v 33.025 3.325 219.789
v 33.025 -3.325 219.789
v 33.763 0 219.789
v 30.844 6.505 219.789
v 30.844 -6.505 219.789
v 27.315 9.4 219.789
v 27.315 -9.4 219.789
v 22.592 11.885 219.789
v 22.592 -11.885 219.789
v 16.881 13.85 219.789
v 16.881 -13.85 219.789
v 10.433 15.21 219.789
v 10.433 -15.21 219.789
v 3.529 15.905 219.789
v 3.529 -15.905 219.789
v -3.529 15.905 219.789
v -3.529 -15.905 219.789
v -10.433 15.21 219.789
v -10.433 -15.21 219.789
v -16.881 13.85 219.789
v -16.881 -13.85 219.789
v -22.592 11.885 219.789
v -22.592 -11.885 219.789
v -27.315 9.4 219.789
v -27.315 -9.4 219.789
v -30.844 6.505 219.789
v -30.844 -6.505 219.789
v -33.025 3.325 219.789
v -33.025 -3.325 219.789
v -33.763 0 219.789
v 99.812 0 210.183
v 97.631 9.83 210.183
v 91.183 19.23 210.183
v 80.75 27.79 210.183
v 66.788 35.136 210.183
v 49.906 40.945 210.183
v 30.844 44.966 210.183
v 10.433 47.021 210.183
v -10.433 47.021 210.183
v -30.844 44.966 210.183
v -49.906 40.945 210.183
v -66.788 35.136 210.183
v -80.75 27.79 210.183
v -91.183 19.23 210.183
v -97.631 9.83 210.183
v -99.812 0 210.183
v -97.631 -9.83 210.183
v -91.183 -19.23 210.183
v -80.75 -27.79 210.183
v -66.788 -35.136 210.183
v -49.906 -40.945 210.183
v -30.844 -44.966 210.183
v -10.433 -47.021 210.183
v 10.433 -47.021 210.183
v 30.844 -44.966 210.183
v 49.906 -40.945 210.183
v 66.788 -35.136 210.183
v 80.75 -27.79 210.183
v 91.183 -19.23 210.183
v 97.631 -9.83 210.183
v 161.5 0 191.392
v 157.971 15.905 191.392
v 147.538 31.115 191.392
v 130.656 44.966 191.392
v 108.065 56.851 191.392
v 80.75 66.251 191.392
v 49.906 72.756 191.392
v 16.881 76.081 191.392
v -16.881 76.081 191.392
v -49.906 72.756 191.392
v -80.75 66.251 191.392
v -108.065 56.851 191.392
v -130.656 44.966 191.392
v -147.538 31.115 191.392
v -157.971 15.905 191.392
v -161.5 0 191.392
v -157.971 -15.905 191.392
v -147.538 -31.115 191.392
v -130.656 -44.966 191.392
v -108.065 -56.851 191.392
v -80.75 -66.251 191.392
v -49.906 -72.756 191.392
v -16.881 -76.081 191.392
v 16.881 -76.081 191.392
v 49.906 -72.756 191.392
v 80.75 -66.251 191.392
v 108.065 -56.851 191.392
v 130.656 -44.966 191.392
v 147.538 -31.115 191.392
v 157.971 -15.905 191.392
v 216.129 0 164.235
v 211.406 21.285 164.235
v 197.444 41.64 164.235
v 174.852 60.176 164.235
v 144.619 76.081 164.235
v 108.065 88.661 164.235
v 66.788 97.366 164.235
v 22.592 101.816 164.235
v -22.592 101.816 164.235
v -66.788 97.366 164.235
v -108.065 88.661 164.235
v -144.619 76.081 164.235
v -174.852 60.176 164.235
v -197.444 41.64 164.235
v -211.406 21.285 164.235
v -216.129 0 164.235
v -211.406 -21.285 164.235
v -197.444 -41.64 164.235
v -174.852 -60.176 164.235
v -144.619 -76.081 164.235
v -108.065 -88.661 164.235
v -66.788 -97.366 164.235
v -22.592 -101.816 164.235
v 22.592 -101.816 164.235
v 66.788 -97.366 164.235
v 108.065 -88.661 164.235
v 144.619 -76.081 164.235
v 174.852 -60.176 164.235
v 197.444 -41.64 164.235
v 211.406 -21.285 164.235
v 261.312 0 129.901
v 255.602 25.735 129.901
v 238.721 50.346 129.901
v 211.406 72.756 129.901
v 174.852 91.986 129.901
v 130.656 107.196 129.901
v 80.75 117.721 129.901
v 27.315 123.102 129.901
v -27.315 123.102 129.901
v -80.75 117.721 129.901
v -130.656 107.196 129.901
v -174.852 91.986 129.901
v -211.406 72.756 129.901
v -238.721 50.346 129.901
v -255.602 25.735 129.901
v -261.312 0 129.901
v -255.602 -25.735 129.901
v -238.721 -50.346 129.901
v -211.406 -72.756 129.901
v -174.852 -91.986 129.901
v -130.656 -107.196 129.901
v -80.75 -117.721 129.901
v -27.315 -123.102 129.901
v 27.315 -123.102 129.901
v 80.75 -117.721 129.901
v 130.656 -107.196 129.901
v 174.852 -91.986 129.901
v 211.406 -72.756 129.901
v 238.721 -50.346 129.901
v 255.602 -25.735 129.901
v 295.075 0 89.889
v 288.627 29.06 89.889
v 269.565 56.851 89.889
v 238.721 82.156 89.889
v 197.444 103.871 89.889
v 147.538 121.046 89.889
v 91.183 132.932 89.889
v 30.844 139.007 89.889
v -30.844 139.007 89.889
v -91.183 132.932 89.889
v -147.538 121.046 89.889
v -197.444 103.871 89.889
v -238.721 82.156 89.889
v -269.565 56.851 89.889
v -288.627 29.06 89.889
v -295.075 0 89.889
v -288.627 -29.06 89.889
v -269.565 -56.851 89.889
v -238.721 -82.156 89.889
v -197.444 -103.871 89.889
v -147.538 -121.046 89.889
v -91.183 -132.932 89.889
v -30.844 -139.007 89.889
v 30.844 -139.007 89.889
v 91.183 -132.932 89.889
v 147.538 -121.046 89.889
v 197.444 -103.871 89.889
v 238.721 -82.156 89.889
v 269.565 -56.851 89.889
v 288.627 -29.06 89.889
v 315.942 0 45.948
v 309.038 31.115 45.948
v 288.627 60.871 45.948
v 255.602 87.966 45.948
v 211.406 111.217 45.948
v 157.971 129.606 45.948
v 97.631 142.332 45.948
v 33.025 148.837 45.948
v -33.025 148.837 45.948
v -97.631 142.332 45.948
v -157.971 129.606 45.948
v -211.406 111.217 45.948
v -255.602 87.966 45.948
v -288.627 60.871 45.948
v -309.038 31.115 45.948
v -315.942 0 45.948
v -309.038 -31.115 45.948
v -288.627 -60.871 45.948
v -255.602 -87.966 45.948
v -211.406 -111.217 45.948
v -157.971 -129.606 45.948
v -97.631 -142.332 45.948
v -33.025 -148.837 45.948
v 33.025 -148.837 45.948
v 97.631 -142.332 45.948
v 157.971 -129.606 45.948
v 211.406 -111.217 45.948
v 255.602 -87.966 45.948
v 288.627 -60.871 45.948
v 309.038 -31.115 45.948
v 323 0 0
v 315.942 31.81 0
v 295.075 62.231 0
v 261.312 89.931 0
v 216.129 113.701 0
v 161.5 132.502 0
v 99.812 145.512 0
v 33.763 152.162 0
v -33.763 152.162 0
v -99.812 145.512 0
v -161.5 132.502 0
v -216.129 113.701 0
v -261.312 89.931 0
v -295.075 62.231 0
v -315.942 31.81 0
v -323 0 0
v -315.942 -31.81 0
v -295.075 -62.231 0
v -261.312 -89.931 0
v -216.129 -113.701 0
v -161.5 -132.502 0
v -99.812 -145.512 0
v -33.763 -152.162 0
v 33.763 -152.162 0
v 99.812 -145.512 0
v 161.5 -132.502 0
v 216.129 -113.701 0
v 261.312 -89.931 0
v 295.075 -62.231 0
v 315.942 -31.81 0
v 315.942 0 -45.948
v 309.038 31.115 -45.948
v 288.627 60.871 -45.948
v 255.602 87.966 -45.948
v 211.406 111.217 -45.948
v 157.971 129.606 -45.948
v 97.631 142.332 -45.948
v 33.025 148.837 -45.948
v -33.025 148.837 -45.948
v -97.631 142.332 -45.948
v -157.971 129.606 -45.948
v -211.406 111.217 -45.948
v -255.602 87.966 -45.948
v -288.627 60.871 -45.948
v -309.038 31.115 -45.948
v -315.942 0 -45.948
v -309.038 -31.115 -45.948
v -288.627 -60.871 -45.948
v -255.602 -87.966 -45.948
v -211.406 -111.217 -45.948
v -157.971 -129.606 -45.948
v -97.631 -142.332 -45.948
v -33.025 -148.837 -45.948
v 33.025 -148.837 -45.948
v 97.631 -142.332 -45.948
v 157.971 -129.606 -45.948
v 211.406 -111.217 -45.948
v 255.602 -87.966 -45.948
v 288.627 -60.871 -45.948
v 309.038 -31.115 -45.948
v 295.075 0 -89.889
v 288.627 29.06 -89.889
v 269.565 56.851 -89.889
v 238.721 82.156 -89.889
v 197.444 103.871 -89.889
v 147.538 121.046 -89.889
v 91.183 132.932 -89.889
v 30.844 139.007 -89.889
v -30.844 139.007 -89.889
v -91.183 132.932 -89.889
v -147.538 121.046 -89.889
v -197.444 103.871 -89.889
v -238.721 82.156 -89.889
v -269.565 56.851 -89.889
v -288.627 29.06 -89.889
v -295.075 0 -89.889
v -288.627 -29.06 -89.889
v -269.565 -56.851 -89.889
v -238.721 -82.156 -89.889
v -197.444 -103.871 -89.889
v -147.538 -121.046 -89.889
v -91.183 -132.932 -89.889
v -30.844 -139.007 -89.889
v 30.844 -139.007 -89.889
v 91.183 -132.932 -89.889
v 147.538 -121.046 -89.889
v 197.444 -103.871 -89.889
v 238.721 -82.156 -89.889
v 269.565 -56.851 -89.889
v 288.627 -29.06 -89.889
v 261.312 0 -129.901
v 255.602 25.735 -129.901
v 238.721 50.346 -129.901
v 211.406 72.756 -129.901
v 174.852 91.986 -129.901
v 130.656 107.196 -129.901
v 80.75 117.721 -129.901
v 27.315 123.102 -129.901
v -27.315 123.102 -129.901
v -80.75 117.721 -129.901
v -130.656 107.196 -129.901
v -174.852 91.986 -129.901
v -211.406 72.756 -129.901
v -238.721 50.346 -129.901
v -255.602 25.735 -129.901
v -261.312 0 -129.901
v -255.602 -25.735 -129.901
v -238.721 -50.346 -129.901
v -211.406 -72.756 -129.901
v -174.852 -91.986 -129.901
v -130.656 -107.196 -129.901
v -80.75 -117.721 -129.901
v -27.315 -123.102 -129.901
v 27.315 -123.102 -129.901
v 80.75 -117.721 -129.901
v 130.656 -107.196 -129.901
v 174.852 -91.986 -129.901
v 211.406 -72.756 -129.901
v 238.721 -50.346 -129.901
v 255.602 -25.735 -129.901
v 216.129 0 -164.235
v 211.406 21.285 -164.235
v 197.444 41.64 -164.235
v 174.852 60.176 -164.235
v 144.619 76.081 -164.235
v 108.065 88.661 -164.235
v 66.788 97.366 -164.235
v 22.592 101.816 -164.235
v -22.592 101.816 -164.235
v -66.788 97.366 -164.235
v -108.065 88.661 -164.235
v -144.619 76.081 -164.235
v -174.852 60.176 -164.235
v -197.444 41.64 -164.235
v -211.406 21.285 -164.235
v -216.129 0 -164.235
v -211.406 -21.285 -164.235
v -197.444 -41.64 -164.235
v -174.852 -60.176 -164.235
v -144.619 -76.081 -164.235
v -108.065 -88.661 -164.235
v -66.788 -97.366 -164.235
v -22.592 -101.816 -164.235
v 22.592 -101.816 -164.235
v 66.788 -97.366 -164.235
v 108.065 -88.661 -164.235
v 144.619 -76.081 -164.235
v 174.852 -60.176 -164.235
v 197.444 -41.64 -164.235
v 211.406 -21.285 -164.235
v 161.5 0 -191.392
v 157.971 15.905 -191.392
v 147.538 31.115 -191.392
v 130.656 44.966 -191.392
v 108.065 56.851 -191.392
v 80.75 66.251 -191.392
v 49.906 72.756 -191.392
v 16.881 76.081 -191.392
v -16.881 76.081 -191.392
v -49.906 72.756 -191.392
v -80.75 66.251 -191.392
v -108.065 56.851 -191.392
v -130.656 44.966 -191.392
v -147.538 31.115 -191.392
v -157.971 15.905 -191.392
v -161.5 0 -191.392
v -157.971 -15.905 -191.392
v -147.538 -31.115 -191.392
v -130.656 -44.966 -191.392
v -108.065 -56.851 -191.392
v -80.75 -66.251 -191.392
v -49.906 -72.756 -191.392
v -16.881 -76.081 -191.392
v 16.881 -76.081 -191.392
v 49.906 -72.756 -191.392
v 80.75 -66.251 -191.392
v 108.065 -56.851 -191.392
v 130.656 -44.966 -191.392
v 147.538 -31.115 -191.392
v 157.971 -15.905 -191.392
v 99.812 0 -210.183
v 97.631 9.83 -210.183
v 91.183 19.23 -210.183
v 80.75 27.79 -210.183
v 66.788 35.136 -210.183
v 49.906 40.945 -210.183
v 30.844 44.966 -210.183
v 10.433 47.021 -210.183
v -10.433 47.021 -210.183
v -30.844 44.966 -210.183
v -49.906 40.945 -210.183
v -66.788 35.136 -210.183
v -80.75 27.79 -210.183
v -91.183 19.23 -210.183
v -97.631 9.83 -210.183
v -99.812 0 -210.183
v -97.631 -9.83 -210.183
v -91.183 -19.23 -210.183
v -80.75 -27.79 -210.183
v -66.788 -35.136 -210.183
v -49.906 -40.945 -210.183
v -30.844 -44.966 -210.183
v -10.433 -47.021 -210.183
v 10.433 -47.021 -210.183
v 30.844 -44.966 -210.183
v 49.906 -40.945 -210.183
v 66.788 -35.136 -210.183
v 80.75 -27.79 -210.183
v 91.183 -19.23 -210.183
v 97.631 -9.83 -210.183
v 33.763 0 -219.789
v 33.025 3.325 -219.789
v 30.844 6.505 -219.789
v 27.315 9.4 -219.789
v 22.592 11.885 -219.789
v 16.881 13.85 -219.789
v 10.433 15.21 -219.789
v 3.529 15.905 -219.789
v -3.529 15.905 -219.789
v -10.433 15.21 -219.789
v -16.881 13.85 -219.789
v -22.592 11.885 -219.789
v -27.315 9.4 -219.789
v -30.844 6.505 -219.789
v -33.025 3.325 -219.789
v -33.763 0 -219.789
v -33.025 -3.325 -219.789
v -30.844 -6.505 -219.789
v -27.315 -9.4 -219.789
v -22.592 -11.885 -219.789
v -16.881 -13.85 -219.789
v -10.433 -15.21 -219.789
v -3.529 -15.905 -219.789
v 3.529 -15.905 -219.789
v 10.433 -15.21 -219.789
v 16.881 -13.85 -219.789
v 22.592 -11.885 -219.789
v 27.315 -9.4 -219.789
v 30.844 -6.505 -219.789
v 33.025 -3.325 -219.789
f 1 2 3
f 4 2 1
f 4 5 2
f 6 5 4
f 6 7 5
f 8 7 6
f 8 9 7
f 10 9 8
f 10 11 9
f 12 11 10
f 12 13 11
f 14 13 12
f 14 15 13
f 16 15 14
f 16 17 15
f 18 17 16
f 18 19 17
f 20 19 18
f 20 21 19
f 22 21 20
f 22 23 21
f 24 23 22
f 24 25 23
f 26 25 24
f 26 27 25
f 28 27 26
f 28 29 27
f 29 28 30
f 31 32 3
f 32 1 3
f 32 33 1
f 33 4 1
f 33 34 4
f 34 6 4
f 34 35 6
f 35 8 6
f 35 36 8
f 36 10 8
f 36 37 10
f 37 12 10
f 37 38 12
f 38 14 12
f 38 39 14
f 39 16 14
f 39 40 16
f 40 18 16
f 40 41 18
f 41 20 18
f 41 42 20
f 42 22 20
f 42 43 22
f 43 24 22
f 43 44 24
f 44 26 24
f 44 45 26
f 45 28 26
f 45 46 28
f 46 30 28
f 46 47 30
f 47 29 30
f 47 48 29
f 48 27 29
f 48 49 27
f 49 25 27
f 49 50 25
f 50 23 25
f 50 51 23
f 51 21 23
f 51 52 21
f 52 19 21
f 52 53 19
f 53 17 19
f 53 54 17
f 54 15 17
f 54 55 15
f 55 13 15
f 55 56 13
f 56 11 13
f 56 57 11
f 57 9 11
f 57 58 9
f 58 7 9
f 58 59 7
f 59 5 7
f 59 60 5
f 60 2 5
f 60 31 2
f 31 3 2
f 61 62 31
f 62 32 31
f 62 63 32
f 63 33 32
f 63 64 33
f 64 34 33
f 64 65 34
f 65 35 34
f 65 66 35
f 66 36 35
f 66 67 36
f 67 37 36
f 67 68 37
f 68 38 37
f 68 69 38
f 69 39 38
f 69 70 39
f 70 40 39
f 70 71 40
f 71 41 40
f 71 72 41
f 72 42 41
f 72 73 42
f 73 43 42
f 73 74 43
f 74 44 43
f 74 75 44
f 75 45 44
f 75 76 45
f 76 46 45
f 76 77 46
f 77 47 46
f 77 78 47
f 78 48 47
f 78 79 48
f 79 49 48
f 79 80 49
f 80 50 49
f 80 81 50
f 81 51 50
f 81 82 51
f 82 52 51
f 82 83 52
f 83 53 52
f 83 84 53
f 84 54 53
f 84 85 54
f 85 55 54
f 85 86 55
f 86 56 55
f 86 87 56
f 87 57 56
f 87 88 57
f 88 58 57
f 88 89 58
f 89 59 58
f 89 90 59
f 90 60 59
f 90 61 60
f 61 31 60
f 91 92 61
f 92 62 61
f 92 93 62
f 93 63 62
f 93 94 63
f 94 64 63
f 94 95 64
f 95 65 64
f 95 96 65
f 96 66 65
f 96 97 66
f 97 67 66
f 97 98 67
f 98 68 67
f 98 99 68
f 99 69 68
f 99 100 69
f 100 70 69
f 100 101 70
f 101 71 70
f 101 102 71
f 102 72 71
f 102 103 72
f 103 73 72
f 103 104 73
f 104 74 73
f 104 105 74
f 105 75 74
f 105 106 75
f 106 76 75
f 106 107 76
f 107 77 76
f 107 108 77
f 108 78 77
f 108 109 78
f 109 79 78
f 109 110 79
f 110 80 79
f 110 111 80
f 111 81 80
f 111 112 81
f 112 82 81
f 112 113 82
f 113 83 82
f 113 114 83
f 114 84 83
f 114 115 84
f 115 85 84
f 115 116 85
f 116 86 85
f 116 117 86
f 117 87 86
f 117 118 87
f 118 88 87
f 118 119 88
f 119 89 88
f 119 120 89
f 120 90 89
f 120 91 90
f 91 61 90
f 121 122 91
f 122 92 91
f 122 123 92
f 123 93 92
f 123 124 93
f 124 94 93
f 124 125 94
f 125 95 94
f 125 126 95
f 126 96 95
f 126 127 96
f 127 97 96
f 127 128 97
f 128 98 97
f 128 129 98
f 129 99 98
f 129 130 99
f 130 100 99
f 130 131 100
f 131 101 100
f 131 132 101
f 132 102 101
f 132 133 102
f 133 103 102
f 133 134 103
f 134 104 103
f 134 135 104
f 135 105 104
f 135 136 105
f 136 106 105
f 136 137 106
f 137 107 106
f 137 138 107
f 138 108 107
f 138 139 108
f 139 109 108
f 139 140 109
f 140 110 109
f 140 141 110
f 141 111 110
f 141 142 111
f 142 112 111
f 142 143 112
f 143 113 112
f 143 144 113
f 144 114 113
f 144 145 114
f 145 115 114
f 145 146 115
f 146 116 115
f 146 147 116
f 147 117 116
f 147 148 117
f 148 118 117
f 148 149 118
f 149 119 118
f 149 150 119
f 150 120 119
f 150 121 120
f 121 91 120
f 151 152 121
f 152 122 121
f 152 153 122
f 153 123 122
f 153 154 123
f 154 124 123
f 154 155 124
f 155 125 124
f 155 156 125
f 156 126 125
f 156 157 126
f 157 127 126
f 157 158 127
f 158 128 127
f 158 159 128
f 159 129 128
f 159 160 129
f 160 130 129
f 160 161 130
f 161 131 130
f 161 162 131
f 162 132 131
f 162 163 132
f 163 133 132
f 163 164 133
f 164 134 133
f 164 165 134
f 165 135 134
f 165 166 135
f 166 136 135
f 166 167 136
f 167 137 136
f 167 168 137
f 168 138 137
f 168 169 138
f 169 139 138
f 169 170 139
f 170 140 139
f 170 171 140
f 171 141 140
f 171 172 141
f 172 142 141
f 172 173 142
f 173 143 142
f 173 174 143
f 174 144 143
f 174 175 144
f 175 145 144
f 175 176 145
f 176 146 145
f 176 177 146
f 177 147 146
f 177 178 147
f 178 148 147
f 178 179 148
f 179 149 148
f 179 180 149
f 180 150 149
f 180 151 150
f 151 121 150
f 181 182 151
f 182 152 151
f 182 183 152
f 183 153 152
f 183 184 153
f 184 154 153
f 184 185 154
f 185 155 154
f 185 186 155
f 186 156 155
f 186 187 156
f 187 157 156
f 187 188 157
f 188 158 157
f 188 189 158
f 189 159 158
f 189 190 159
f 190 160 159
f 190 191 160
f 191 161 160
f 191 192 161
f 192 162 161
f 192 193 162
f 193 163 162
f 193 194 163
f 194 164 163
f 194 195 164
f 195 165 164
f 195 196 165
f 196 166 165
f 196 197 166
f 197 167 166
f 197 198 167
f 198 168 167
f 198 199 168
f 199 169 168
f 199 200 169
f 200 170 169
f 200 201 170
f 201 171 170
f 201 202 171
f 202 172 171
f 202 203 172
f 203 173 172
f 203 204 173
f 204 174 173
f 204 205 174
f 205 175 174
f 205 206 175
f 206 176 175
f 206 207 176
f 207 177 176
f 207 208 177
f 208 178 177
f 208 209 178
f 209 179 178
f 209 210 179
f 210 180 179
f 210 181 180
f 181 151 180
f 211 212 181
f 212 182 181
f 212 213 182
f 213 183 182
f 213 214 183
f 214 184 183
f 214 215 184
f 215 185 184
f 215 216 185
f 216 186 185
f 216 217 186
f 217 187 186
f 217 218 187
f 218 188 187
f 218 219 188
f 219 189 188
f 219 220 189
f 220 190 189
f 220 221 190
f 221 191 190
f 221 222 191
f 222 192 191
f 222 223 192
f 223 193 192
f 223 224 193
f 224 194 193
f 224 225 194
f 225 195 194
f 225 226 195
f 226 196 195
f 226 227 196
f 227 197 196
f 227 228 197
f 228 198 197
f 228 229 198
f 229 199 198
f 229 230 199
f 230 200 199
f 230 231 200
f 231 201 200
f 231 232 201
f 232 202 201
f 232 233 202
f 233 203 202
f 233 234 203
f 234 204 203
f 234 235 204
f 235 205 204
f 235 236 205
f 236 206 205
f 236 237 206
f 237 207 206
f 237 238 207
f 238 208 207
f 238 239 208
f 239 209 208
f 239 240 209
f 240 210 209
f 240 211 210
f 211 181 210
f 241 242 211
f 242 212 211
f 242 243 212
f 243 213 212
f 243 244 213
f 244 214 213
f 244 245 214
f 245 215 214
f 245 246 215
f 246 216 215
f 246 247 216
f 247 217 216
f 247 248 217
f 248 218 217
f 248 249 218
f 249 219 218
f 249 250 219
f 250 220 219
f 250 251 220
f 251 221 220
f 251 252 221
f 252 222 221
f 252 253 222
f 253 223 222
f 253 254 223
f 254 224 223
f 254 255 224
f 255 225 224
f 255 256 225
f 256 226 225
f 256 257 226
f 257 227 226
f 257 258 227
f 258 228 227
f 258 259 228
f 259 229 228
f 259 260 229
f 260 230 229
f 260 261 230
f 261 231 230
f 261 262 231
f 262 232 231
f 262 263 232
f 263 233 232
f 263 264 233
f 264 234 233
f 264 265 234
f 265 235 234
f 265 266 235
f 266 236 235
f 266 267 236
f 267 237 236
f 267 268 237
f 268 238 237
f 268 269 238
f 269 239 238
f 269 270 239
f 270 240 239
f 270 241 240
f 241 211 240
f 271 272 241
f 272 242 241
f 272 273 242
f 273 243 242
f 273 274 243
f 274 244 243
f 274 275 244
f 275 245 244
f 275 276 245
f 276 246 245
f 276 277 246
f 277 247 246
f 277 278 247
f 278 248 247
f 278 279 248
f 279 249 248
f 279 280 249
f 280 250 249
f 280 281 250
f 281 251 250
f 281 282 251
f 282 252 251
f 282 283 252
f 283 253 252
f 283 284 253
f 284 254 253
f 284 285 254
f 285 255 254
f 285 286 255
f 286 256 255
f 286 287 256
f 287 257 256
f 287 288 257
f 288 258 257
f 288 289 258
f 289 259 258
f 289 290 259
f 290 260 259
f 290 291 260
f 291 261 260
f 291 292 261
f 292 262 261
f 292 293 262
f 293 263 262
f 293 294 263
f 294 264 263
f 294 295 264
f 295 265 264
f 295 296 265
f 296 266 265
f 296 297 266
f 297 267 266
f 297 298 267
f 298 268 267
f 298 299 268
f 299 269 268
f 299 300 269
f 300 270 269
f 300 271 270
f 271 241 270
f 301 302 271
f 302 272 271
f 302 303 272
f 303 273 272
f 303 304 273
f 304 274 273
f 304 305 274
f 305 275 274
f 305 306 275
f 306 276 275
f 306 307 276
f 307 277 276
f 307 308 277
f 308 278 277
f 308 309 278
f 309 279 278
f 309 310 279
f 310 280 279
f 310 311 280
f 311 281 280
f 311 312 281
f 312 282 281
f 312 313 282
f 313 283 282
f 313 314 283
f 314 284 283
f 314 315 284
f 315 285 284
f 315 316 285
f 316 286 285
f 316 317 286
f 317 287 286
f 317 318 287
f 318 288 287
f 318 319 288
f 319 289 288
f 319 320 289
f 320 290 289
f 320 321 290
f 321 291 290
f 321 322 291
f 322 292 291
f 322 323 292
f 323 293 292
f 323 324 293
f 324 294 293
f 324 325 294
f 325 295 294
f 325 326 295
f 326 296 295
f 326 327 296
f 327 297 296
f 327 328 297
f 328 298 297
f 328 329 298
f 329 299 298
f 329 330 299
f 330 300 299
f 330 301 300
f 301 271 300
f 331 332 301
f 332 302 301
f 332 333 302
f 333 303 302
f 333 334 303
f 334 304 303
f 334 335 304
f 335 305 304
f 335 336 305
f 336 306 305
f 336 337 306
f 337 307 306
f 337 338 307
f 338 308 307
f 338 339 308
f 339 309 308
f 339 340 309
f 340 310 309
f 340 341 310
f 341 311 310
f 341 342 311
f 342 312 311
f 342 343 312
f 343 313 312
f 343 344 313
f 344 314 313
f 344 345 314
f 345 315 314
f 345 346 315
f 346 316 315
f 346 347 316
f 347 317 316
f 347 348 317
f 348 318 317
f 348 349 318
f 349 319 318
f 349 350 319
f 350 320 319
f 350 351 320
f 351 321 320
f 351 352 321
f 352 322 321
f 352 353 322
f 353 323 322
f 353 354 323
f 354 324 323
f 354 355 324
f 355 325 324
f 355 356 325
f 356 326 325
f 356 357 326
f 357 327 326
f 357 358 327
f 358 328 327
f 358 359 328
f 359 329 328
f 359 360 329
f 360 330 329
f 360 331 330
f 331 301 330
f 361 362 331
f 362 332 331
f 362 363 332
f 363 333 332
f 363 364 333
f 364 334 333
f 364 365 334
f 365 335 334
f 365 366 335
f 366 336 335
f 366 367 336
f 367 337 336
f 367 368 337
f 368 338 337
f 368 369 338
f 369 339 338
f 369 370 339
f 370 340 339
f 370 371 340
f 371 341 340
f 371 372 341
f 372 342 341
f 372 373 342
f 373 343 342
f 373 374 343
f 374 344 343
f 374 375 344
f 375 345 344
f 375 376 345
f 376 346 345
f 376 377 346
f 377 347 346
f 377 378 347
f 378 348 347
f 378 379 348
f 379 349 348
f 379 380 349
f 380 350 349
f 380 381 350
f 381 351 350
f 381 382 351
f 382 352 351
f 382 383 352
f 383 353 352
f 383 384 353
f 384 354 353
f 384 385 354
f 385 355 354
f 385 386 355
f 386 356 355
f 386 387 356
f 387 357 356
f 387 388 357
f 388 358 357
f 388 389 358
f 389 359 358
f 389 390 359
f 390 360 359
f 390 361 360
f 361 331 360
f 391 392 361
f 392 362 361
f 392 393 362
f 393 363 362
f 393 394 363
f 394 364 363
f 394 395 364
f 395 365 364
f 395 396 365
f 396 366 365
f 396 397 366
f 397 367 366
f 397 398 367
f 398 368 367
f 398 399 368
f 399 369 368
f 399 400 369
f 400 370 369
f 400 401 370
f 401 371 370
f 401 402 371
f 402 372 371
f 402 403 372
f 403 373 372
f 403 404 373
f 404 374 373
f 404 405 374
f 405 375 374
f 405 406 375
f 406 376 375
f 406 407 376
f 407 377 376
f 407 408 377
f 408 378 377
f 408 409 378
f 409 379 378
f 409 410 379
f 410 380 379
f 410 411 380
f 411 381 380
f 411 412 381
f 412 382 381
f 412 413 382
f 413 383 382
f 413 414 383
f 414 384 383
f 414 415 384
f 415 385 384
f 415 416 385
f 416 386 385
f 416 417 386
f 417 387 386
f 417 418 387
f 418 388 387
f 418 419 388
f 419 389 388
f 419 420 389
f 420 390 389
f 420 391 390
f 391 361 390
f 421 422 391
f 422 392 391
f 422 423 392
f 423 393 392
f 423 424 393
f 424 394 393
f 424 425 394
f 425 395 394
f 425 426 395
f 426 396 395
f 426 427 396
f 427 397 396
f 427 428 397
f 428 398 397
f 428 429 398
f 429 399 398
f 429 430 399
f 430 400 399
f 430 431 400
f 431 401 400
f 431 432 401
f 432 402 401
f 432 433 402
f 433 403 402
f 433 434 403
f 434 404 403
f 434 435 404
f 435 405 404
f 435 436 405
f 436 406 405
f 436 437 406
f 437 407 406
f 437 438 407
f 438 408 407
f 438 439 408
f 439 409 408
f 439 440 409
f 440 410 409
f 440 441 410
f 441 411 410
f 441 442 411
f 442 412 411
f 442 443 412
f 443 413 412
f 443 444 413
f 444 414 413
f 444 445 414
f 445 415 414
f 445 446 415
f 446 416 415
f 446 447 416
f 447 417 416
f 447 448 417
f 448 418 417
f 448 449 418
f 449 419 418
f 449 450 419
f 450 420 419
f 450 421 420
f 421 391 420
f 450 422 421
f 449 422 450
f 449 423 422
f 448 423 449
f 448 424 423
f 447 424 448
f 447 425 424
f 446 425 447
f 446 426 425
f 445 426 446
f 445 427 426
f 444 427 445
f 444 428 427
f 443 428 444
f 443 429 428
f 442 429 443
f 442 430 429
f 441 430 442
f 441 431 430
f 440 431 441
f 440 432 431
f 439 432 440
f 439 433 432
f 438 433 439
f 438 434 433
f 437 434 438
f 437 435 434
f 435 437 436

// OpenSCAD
// Generated by SolidPython 1.0.1 on 2020-07-29 00:46:54


scale(v = [19, 9, 13]) {
	sphere(r = 17);
}
/***********************************************
*********      SolidPython code:      **********
************************************************
 
# import packages: SolidPython
from solid import *
from solid.utils import *
from itertools import chain, combinations, permutations


class Resize:

    def __init__(self, scad_file):
        self.scad_file = scad_file
        #self.scad_file = import_scad(scad_file)
        # cone/cylinder param:
        self.r1 = 0
        self.r2 = 0
        self.h = 0
        # rectangular prism param:
        self.w = 0
        self.l = 0
        # ellipse param:
        self.r = 0

    # import OpenScad code (file name corresponds to shape)


    # classify shape + parameters
    def assign(self, param1, param2, param3):
        if self.scad_file == 'cone.scad':
            self.r1 = param1
            self.r2 = param2
            self.h = param3
        elif self.scad_file == 'cylinder.scad':
            self.r1 = param1
            self.r2 = param2
            self.h = param3
        elif self.scad_file == 'rectangularPrism.scad':
            self.h = param1
            self.l = param2
            self.w = param3
        else:
            self.r = param1
            self.h = param2

    # resize parameters
    def iterate(self):
        x = range(3, 20, 2)
        i = 1
        if self.scad_file == 'cone.scad':
            tempList = list(permutations(x, 2))
            for temp in tempList:
                param1 = temp[0]
                param2 = temp[1]
                filepath = 'produced_scad_files/' + 'cone' + str(param1) + '_' + str(param2) + '_' + '.scad'
                scad_render_to_file(cylinder(h=param1, r1=param2, r2=0), filepath)

        elif self.scad_file == 'cylinder.scad':
            tempList = list(permutations(x, 3))
            for temp in tempList:
                param1 = temp[0]
                param2 = temp[1]
                filepath = 'produced_scad_files/' + 'cylinder' + str(param1) + '_' + str(param2) + '_' + '.scad'
                scad_render_to_file(cylinder(h=param1, r1=param2, r2=param2), filepath)

        elif self.scad_file == 'rectangularPrism.scad':
            tempList = list(permutations(x, 3))
            for temp in tempList:
                param1 = temp[0]
                param2 = temp[1]
                param3 = temp[2]
                filepath = 'produced_scad_files/' + 'rectangularPrism' + str(param1) + '_' + str(param2) + '_' + str(
                    param3) + '.scad'
                scad_render_to_file(cube(size=(param1, param2, param3)), filepath)

        elif self.scad_file == 'ellipse.scad':
            tempList = list(permutations(x, 4))
            for temp in tempList:
                param1 = temp[0]
                param2 = temp[1]
                param3 = temp[2]
                param4 = temp[3]
                filepath = 'produced_scad_files/' + 'ellipse' + str(param1) + '_' + str(param2) + '_' + str(param3) + '_' + str(param4) + '.scad'
                scad_render_to_file(scale([param1, param2, param3])(sphere(r=param4)), filepath)

    def render_to_scadfile(self):
        scad_render_to_file(scad, 'example.scad') 
 
************************************************/
